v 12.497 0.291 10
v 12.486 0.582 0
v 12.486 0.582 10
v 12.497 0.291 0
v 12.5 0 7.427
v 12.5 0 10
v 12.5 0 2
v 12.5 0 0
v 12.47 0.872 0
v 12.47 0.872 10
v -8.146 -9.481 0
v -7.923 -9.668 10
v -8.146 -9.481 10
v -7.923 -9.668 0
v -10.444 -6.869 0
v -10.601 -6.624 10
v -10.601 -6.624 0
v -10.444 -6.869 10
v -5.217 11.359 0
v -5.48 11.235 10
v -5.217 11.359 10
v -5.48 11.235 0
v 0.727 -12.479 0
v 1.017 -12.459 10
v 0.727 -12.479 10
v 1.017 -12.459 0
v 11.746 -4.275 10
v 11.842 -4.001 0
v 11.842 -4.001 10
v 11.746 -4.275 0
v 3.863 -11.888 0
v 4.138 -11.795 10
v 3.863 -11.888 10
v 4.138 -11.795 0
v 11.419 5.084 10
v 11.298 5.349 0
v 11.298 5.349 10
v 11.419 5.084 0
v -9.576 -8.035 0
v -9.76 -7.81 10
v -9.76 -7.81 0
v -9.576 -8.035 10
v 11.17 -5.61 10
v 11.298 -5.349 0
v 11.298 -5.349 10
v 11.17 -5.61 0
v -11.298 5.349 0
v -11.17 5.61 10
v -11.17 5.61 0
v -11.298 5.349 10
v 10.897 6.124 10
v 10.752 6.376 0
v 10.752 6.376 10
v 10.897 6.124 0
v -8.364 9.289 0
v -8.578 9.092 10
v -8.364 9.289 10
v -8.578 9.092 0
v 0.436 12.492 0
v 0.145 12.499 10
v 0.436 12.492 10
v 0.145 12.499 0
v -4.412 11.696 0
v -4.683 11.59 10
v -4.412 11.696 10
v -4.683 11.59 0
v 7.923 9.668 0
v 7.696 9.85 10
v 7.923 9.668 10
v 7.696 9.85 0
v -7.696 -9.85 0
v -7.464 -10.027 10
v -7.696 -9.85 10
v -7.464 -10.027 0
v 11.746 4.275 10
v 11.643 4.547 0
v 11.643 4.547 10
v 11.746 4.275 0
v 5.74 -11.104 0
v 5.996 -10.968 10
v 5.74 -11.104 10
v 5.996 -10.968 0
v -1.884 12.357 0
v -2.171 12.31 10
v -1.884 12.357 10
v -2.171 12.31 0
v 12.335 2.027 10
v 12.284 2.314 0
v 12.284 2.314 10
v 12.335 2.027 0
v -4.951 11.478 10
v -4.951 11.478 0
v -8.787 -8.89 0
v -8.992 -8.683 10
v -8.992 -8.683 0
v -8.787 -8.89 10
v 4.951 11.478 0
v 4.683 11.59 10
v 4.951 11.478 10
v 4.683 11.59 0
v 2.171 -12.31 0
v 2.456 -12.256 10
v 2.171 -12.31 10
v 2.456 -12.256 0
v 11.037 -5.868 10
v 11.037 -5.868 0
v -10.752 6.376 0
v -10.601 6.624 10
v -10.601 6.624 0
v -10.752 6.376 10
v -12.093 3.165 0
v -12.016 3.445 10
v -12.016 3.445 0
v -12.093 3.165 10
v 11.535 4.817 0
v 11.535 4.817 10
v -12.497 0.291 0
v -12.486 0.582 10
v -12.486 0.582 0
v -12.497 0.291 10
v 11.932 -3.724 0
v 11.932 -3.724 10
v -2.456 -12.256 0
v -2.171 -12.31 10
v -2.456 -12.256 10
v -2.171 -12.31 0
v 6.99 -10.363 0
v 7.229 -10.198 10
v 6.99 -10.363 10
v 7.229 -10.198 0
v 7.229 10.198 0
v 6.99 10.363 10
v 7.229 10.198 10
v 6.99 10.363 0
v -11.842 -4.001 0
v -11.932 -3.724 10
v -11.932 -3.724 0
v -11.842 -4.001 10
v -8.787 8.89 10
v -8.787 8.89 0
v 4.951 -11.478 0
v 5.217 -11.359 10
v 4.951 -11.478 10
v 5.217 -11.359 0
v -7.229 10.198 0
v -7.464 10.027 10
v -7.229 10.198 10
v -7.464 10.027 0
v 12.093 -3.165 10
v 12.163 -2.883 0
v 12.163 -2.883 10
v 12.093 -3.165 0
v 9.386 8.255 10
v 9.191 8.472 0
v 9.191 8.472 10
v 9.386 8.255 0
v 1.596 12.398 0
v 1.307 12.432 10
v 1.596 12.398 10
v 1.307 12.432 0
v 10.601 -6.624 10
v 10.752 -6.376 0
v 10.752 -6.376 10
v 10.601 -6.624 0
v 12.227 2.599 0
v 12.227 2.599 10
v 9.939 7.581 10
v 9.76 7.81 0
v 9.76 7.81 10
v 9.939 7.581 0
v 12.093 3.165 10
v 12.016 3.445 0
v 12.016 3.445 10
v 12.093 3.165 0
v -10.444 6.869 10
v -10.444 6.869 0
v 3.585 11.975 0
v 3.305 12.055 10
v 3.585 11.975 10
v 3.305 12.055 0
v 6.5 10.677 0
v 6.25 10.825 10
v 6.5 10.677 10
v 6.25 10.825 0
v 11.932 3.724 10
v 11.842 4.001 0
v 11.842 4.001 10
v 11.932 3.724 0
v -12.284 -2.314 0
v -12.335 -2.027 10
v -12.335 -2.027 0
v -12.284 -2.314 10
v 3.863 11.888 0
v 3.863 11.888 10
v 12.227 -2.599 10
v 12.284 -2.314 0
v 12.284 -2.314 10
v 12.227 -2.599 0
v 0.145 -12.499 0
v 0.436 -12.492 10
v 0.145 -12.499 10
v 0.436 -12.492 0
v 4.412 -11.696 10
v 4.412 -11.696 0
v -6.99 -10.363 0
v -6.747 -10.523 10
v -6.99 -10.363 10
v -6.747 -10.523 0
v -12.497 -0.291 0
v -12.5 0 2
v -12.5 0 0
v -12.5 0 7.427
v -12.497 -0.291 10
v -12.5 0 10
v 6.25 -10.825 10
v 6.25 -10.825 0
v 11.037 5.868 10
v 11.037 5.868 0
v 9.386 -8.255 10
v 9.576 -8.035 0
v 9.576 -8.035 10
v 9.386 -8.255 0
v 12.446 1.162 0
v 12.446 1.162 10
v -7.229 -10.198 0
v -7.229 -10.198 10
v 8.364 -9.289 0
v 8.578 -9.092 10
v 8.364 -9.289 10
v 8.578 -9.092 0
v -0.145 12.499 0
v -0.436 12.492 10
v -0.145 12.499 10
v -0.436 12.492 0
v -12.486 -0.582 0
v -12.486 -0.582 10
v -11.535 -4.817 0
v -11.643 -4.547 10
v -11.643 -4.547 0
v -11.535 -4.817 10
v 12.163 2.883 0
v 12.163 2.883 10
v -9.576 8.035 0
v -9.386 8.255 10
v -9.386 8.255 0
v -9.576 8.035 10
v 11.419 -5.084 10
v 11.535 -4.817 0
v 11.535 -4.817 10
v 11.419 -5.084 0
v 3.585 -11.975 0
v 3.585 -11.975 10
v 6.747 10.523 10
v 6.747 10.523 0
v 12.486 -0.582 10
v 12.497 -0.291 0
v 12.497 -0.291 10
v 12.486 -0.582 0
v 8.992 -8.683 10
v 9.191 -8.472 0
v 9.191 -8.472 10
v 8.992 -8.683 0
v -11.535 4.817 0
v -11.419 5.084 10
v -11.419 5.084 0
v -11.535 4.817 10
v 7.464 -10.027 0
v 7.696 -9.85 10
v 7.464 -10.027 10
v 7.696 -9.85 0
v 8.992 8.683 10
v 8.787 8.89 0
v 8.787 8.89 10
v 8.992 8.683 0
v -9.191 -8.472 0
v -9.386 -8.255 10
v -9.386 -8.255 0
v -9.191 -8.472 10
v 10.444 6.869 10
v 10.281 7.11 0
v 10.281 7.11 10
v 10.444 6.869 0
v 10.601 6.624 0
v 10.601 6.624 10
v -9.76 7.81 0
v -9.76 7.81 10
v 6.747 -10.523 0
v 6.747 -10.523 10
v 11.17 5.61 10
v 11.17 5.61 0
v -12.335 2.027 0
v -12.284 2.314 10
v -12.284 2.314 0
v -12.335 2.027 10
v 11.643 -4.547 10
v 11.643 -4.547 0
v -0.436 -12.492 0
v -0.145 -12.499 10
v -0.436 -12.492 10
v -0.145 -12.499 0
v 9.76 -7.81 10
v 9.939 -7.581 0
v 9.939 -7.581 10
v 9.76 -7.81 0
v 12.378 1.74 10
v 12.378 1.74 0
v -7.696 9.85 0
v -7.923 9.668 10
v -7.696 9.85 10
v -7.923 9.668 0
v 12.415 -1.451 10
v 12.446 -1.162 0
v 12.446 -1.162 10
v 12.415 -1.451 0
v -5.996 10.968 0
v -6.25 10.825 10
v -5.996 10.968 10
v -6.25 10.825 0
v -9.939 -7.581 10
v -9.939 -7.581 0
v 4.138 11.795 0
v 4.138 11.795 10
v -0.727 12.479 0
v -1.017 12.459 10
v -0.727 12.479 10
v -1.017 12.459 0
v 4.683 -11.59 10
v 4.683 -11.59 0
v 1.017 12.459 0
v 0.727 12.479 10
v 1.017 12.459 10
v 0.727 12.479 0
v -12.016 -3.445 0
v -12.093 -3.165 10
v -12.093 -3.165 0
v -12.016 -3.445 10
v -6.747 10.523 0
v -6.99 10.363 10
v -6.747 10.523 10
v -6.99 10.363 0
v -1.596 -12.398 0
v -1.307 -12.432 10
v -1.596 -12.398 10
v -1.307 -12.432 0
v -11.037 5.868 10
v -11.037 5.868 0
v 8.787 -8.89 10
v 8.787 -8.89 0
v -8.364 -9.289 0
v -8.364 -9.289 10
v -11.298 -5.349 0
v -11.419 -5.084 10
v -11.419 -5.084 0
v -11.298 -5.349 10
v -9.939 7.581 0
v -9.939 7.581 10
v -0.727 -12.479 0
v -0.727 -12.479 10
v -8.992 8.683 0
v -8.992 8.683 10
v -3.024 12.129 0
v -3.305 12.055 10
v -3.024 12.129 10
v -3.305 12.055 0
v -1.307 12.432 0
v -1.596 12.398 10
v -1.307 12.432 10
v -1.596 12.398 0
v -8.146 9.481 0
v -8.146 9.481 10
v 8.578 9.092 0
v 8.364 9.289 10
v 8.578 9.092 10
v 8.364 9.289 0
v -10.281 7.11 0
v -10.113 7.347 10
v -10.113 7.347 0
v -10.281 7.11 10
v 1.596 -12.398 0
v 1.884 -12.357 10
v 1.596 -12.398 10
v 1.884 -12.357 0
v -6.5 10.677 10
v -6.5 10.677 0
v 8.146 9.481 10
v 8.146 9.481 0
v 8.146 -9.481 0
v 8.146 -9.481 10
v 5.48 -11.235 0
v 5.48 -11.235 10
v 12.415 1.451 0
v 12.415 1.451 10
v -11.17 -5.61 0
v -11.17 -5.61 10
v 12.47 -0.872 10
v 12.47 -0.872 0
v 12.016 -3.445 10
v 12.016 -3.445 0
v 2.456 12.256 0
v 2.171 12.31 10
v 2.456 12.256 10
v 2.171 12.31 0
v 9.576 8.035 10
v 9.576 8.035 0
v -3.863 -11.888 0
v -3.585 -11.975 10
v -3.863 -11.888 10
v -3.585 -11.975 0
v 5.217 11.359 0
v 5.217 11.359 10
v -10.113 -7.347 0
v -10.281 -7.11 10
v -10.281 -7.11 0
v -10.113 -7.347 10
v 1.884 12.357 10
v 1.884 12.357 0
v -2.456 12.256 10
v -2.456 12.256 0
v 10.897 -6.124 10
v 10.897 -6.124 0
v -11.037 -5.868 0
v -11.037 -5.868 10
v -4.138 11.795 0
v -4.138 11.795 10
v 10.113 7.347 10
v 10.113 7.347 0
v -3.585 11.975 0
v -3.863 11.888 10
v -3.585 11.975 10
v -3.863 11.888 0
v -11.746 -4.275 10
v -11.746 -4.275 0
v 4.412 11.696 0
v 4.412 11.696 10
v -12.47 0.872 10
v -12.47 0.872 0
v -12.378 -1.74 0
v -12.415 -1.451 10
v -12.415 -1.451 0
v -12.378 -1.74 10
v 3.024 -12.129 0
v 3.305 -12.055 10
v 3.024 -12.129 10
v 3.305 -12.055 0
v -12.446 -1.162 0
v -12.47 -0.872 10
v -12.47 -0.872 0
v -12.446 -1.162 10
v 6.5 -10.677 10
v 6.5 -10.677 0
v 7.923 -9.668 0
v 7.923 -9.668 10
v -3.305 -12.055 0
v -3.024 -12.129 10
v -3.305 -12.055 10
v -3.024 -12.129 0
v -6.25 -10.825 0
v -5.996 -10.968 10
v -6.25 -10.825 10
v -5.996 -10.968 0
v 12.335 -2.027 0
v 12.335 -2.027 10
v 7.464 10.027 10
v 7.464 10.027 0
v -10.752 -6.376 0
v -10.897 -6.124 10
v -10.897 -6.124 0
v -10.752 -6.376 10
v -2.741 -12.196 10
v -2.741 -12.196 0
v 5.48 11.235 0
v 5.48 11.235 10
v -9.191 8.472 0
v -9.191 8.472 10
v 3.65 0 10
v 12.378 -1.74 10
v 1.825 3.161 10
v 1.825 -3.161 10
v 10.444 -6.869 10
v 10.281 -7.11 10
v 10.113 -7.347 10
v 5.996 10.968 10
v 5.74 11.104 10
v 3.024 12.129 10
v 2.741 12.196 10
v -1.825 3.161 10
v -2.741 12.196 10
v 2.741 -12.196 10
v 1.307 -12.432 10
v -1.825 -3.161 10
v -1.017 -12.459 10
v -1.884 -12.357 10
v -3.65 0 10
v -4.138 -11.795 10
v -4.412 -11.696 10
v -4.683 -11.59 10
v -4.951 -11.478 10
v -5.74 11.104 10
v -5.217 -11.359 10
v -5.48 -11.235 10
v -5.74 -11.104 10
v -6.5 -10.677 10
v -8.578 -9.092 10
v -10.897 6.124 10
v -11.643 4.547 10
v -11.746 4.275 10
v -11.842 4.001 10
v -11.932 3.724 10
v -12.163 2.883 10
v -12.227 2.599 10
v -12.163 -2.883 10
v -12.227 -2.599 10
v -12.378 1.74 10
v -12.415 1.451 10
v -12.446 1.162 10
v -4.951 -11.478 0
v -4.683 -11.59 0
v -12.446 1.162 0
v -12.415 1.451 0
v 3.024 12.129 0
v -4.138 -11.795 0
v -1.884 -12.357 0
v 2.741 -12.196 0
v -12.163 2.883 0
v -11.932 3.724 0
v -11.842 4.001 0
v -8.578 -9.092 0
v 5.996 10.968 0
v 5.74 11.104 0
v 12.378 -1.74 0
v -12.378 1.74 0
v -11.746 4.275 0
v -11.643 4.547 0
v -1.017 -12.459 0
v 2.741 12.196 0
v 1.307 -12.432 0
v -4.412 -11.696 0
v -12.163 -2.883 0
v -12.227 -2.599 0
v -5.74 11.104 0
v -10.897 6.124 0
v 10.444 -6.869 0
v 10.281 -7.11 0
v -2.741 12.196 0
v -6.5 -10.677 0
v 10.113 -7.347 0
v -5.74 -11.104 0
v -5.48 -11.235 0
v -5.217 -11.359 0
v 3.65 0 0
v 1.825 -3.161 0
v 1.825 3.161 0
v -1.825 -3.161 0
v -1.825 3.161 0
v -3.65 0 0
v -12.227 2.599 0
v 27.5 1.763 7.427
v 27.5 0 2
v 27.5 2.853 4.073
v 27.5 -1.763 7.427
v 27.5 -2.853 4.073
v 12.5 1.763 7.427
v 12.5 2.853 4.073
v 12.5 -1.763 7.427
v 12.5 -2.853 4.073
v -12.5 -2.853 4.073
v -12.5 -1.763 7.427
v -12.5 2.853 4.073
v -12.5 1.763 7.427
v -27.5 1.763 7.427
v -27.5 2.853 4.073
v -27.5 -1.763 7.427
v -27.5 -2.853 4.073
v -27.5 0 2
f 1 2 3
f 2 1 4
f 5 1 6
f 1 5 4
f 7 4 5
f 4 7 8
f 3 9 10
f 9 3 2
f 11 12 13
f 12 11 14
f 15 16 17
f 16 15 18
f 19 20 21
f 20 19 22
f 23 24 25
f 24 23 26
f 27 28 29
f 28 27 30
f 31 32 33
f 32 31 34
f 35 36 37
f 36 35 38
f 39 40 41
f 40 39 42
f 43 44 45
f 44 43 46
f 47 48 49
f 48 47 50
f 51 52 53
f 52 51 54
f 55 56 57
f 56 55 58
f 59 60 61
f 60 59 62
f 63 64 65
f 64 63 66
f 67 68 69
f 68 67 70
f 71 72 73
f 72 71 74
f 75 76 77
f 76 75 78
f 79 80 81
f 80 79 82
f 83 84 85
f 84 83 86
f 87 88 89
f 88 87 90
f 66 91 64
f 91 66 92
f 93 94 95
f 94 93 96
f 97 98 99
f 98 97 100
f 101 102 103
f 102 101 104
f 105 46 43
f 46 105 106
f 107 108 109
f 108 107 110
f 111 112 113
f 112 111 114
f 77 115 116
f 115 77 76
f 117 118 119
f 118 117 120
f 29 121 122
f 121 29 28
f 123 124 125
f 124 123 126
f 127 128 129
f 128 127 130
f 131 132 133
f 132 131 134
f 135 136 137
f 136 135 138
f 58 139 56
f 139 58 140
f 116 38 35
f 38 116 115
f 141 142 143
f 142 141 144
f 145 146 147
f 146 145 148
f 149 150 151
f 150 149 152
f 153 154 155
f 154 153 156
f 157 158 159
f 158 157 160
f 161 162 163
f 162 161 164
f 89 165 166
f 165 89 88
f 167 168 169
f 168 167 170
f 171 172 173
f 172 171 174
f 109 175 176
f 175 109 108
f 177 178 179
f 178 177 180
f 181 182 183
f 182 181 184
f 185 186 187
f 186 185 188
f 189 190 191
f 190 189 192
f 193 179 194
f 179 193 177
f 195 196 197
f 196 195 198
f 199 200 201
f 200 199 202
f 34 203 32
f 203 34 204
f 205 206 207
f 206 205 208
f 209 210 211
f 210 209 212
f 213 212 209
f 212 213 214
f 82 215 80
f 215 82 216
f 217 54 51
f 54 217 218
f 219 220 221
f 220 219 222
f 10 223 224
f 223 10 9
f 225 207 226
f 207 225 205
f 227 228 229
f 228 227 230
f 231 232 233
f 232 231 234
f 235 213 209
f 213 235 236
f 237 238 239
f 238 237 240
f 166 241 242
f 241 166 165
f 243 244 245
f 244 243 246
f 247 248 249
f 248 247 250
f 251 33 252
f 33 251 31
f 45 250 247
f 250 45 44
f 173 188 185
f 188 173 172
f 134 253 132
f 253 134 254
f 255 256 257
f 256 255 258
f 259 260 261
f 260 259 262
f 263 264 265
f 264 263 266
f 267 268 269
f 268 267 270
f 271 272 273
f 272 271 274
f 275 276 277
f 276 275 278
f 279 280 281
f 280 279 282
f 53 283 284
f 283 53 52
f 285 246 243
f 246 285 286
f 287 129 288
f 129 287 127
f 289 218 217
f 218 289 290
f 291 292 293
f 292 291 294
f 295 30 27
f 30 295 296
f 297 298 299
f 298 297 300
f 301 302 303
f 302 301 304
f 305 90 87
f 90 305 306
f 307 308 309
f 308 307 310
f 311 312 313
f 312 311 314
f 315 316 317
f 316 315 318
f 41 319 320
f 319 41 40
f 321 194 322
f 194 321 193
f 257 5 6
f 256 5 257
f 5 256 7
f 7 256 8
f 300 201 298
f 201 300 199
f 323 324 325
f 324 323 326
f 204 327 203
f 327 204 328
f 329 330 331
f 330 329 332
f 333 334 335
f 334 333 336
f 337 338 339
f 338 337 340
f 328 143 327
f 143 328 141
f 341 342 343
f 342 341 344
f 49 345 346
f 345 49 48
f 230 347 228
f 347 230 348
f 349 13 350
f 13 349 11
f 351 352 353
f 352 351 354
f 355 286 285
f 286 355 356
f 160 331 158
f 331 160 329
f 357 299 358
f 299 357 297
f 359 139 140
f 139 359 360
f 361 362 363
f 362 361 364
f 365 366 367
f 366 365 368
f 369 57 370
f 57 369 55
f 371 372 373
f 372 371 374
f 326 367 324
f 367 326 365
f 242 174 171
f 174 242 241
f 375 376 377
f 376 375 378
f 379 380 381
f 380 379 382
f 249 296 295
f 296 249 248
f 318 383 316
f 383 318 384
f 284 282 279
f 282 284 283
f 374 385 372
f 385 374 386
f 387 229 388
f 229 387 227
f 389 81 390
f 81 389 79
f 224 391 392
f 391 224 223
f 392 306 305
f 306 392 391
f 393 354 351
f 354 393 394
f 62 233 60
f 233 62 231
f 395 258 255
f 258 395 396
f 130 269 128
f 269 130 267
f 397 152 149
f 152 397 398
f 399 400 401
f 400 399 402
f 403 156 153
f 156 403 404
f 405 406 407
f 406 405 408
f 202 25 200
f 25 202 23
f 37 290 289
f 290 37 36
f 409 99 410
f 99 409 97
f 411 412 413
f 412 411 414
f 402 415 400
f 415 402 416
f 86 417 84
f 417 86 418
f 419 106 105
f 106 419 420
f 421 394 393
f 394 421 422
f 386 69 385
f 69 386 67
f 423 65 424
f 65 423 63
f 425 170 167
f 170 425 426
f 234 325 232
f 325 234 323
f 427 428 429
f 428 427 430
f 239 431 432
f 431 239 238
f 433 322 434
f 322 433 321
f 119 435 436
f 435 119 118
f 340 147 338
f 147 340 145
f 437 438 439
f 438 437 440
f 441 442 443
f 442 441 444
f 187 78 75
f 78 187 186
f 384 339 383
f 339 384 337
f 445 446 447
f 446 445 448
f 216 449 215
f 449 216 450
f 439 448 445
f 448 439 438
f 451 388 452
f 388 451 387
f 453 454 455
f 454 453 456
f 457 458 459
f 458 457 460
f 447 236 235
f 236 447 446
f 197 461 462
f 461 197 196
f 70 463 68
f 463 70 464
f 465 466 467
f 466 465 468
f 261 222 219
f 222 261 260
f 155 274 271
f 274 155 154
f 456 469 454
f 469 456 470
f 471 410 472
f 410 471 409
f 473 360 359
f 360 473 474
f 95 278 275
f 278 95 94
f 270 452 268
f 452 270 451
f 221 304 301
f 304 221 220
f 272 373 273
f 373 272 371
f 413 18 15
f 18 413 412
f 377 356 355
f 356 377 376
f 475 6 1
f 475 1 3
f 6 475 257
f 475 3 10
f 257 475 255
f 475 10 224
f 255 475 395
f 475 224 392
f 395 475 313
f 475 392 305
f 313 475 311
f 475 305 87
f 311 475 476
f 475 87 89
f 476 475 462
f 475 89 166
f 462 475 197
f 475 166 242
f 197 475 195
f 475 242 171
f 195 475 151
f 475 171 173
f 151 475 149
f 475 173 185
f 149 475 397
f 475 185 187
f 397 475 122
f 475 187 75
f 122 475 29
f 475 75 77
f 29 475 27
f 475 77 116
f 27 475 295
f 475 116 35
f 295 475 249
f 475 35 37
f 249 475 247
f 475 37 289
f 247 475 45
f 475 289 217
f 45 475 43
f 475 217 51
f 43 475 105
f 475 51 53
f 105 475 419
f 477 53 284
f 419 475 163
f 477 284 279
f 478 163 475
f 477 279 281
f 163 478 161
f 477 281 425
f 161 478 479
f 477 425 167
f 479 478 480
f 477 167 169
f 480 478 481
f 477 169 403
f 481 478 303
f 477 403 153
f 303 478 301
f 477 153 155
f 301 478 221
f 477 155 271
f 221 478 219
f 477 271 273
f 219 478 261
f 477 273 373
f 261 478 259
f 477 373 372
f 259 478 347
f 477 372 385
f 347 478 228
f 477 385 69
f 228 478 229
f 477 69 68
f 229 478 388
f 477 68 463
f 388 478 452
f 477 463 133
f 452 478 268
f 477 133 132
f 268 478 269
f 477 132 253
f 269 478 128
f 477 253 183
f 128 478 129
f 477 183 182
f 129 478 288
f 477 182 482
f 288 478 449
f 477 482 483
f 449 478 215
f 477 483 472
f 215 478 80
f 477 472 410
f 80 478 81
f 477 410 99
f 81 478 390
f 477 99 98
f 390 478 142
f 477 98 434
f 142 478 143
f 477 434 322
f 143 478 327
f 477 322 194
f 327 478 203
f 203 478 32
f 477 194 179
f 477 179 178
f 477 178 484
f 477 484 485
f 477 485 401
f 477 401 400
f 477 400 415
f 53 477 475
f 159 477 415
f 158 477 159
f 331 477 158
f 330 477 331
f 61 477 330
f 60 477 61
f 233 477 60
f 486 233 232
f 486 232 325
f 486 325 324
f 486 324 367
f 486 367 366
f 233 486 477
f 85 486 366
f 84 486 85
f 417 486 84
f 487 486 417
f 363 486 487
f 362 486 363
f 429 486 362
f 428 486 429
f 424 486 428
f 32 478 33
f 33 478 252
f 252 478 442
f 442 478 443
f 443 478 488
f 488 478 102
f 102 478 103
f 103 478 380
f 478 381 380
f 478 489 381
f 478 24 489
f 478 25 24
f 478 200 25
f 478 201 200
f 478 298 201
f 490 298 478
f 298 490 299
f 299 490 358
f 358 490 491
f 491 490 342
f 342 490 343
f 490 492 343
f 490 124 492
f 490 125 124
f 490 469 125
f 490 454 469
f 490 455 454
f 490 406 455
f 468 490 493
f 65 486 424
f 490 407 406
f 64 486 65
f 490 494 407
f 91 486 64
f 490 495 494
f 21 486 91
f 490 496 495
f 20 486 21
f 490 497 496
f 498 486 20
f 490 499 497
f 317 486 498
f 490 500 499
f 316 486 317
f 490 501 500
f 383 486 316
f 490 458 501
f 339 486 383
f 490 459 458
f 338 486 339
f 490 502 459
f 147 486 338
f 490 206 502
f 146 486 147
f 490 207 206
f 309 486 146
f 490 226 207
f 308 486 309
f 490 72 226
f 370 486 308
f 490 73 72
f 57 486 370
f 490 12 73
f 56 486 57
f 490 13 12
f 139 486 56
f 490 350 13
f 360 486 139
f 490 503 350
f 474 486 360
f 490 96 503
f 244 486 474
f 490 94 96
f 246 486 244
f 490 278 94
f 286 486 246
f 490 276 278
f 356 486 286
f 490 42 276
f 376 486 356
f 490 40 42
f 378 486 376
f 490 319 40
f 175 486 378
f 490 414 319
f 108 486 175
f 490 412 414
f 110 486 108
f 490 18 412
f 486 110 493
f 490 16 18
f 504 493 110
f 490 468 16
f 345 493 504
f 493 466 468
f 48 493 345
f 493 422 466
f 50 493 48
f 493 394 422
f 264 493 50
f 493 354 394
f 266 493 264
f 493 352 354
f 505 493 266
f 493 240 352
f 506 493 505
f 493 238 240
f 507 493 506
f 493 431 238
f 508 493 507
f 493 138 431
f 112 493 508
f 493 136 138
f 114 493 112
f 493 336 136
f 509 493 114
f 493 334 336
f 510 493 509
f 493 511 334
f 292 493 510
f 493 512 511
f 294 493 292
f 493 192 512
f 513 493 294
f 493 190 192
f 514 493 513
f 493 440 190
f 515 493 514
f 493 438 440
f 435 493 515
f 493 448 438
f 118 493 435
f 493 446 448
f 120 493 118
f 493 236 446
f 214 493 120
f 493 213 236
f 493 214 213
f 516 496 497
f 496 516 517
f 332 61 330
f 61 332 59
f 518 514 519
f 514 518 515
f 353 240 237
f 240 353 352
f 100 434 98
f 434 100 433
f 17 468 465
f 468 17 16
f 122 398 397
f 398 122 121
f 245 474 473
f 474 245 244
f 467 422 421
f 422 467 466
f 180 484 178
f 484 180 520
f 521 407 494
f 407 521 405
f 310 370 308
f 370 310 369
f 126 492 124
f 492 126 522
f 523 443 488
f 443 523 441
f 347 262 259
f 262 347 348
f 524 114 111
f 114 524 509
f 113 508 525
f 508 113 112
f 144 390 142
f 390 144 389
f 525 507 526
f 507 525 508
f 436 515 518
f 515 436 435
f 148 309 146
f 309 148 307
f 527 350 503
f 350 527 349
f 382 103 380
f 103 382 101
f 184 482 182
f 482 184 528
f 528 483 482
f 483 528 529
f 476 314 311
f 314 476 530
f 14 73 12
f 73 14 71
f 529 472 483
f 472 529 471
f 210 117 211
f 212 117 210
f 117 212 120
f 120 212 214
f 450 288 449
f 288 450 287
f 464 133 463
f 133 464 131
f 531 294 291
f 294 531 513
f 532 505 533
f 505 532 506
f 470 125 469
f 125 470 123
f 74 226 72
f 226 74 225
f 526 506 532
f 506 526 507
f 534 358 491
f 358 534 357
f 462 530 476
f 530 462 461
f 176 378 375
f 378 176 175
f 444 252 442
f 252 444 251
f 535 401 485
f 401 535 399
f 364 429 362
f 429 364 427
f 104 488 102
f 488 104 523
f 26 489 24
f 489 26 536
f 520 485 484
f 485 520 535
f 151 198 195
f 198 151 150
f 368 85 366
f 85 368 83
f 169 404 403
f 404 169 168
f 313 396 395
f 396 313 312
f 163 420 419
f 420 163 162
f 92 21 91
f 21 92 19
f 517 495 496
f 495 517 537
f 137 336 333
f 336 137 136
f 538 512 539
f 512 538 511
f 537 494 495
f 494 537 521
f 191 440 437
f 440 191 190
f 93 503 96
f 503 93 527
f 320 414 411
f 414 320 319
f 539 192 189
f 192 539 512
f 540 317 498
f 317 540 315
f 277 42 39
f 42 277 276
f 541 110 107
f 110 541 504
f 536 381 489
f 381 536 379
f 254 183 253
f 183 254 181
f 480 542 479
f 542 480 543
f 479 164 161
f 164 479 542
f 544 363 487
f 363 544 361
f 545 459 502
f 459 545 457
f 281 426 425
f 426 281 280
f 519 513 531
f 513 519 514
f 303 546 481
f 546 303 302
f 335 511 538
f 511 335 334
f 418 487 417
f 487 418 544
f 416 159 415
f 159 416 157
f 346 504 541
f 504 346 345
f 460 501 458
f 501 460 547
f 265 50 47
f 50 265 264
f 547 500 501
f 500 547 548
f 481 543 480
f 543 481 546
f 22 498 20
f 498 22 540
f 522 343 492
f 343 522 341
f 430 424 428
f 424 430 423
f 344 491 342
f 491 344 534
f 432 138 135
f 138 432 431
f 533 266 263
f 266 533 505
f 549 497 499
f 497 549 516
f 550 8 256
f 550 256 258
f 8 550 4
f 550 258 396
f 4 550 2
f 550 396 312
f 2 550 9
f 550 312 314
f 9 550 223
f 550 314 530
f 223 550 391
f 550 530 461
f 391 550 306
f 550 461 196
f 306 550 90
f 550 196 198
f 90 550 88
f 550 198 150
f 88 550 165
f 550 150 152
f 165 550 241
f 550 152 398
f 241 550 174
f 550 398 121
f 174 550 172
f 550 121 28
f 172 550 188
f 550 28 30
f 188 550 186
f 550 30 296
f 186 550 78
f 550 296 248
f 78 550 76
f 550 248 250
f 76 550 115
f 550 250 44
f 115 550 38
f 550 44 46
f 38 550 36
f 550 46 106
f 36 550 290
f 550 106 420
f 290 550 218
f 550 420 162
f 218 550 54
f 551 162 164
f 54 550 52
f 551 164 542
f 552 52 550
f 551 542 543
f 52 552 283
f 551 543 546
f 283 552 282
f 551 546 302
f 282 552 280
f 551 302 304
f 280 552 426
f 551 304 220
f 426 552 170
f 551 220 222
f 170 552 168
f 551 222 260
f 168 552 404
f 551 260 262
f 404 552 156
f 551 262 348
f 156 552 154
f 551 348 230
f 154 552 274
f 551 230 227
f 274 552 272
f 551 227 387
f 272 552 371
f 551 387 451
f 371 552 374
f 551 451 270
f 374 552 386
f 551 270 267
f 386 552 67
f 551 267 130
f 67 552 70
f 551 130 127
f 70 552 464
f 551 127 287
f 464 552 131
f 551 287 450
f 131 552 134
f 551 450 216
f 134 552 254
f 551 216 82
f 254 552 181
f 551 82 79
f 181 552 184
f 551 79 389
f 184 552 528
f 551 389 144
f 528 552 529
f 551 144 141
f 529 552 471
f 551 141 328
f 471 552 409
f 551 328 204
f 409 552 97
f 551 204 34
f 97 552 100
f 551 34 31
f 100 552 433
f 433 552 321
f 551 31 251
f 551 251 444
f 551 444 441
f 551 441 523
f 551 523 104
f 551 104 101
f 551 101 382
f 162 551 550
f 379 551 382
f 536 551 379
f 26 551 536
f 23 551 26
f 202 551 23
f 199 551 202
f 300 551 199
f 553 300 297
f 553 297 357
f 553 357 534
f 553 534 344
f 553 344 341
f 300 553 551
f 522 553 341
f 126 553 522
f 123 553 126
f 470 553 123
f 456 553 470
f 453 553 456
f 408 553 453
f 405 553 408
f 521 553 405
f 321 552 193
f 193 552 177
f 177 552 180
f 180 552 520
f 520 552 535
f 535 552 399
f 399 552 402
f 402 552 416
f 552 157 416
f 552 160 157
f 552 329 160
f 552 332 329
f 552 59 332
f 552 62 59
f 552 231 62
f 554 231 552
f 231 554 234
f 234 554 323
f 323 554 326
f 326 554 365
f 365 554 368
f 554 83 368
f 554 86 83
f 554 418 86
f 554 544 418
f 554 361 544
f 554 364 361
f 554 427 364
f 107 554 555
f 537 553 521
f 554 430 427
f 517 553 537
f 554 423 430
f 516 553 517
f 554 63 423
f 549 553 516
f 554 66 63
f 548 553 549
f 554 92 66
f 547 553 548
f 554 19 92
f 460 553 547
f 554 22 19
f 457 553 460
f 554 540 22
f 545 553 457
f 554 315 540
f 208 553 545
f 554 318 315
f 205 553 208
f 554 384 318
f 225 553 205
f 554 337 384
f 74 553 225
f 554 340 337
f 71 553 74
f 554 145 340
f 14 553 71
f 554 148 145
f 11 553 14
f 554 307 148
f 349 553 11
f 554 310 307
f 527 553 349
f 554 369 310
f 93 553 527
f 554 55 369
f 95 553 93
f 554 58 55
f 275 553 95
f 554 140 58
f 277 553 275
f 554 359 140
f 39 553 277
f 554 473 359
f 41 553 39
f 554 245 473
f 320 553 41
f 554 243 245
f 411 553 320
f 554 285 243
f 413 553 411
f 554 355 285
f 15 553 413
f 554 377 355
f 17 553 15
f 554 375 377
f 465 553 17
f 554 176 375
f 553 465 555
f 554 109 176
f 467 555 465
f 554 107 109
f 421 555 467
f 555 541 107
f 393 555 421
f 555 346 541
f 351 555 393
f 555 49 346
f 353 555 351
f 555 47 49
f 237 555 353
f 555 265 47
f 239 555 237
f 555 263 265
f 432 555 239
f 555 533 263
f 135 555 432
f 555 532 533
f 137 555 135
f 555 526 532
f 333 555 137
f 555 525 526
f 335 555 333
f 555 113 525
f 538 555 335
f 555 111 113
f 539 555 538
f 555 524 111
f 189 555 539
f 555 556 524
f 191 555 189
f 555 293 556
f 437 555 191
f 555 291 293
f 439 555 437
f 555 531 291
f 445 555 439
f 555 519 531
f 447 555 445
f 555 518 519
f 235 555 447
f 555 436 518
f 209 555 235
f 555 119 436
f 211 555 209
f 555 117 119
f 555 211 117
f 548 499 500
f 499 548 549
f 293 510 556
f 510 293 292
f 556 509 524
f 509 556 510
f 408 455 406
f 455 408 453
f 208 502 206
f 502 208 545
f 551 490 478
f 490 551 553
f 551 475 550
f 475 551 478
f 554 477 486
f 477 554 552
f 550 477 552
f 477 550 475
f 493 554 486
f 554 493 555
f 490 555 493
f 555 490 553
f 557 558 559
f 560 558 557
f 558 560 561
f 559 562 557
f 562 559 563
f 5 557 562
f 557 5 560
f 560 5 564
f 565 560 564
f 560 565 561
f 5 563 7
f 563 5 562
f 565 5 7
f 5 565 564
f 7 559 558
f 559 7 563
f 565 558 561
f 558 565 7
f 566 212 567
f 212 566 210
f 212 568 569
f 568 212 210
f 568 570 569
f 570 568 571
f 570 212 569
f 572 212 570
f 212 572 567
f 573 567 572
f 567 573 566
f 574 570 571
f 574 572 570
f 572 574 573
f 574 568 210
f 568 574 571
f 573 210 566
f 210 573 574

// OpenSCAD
// NOTE: printed at 6.89 to 6.95
hex_dia = 7.30;
cyl_len = 10;
cyl_dia = 25;
handle_dia = 6;
handle_len = 15;

union() {
    difference() {
        cylinder(d=cyl_dia, h=cyl_len, $fn=270);
        cylinder(d=hex_dia, h =cyl_len, $fn=6);
    }
    translate([(cyl_dia/2), 0, ((cyl_len /2) )]) {
        rotate([0, 90, 0])
            cylinder(d=handle_dia, h=handle_len, $fn=5);
    }
    translate([-(cyl_dia/2) - handle_len, 0, ((cyl_len /2) )]) {
        rotate([0, 90, 0])
            cylinder(d=handle_dia, h=handle_len, $fn=5);
    }
}
